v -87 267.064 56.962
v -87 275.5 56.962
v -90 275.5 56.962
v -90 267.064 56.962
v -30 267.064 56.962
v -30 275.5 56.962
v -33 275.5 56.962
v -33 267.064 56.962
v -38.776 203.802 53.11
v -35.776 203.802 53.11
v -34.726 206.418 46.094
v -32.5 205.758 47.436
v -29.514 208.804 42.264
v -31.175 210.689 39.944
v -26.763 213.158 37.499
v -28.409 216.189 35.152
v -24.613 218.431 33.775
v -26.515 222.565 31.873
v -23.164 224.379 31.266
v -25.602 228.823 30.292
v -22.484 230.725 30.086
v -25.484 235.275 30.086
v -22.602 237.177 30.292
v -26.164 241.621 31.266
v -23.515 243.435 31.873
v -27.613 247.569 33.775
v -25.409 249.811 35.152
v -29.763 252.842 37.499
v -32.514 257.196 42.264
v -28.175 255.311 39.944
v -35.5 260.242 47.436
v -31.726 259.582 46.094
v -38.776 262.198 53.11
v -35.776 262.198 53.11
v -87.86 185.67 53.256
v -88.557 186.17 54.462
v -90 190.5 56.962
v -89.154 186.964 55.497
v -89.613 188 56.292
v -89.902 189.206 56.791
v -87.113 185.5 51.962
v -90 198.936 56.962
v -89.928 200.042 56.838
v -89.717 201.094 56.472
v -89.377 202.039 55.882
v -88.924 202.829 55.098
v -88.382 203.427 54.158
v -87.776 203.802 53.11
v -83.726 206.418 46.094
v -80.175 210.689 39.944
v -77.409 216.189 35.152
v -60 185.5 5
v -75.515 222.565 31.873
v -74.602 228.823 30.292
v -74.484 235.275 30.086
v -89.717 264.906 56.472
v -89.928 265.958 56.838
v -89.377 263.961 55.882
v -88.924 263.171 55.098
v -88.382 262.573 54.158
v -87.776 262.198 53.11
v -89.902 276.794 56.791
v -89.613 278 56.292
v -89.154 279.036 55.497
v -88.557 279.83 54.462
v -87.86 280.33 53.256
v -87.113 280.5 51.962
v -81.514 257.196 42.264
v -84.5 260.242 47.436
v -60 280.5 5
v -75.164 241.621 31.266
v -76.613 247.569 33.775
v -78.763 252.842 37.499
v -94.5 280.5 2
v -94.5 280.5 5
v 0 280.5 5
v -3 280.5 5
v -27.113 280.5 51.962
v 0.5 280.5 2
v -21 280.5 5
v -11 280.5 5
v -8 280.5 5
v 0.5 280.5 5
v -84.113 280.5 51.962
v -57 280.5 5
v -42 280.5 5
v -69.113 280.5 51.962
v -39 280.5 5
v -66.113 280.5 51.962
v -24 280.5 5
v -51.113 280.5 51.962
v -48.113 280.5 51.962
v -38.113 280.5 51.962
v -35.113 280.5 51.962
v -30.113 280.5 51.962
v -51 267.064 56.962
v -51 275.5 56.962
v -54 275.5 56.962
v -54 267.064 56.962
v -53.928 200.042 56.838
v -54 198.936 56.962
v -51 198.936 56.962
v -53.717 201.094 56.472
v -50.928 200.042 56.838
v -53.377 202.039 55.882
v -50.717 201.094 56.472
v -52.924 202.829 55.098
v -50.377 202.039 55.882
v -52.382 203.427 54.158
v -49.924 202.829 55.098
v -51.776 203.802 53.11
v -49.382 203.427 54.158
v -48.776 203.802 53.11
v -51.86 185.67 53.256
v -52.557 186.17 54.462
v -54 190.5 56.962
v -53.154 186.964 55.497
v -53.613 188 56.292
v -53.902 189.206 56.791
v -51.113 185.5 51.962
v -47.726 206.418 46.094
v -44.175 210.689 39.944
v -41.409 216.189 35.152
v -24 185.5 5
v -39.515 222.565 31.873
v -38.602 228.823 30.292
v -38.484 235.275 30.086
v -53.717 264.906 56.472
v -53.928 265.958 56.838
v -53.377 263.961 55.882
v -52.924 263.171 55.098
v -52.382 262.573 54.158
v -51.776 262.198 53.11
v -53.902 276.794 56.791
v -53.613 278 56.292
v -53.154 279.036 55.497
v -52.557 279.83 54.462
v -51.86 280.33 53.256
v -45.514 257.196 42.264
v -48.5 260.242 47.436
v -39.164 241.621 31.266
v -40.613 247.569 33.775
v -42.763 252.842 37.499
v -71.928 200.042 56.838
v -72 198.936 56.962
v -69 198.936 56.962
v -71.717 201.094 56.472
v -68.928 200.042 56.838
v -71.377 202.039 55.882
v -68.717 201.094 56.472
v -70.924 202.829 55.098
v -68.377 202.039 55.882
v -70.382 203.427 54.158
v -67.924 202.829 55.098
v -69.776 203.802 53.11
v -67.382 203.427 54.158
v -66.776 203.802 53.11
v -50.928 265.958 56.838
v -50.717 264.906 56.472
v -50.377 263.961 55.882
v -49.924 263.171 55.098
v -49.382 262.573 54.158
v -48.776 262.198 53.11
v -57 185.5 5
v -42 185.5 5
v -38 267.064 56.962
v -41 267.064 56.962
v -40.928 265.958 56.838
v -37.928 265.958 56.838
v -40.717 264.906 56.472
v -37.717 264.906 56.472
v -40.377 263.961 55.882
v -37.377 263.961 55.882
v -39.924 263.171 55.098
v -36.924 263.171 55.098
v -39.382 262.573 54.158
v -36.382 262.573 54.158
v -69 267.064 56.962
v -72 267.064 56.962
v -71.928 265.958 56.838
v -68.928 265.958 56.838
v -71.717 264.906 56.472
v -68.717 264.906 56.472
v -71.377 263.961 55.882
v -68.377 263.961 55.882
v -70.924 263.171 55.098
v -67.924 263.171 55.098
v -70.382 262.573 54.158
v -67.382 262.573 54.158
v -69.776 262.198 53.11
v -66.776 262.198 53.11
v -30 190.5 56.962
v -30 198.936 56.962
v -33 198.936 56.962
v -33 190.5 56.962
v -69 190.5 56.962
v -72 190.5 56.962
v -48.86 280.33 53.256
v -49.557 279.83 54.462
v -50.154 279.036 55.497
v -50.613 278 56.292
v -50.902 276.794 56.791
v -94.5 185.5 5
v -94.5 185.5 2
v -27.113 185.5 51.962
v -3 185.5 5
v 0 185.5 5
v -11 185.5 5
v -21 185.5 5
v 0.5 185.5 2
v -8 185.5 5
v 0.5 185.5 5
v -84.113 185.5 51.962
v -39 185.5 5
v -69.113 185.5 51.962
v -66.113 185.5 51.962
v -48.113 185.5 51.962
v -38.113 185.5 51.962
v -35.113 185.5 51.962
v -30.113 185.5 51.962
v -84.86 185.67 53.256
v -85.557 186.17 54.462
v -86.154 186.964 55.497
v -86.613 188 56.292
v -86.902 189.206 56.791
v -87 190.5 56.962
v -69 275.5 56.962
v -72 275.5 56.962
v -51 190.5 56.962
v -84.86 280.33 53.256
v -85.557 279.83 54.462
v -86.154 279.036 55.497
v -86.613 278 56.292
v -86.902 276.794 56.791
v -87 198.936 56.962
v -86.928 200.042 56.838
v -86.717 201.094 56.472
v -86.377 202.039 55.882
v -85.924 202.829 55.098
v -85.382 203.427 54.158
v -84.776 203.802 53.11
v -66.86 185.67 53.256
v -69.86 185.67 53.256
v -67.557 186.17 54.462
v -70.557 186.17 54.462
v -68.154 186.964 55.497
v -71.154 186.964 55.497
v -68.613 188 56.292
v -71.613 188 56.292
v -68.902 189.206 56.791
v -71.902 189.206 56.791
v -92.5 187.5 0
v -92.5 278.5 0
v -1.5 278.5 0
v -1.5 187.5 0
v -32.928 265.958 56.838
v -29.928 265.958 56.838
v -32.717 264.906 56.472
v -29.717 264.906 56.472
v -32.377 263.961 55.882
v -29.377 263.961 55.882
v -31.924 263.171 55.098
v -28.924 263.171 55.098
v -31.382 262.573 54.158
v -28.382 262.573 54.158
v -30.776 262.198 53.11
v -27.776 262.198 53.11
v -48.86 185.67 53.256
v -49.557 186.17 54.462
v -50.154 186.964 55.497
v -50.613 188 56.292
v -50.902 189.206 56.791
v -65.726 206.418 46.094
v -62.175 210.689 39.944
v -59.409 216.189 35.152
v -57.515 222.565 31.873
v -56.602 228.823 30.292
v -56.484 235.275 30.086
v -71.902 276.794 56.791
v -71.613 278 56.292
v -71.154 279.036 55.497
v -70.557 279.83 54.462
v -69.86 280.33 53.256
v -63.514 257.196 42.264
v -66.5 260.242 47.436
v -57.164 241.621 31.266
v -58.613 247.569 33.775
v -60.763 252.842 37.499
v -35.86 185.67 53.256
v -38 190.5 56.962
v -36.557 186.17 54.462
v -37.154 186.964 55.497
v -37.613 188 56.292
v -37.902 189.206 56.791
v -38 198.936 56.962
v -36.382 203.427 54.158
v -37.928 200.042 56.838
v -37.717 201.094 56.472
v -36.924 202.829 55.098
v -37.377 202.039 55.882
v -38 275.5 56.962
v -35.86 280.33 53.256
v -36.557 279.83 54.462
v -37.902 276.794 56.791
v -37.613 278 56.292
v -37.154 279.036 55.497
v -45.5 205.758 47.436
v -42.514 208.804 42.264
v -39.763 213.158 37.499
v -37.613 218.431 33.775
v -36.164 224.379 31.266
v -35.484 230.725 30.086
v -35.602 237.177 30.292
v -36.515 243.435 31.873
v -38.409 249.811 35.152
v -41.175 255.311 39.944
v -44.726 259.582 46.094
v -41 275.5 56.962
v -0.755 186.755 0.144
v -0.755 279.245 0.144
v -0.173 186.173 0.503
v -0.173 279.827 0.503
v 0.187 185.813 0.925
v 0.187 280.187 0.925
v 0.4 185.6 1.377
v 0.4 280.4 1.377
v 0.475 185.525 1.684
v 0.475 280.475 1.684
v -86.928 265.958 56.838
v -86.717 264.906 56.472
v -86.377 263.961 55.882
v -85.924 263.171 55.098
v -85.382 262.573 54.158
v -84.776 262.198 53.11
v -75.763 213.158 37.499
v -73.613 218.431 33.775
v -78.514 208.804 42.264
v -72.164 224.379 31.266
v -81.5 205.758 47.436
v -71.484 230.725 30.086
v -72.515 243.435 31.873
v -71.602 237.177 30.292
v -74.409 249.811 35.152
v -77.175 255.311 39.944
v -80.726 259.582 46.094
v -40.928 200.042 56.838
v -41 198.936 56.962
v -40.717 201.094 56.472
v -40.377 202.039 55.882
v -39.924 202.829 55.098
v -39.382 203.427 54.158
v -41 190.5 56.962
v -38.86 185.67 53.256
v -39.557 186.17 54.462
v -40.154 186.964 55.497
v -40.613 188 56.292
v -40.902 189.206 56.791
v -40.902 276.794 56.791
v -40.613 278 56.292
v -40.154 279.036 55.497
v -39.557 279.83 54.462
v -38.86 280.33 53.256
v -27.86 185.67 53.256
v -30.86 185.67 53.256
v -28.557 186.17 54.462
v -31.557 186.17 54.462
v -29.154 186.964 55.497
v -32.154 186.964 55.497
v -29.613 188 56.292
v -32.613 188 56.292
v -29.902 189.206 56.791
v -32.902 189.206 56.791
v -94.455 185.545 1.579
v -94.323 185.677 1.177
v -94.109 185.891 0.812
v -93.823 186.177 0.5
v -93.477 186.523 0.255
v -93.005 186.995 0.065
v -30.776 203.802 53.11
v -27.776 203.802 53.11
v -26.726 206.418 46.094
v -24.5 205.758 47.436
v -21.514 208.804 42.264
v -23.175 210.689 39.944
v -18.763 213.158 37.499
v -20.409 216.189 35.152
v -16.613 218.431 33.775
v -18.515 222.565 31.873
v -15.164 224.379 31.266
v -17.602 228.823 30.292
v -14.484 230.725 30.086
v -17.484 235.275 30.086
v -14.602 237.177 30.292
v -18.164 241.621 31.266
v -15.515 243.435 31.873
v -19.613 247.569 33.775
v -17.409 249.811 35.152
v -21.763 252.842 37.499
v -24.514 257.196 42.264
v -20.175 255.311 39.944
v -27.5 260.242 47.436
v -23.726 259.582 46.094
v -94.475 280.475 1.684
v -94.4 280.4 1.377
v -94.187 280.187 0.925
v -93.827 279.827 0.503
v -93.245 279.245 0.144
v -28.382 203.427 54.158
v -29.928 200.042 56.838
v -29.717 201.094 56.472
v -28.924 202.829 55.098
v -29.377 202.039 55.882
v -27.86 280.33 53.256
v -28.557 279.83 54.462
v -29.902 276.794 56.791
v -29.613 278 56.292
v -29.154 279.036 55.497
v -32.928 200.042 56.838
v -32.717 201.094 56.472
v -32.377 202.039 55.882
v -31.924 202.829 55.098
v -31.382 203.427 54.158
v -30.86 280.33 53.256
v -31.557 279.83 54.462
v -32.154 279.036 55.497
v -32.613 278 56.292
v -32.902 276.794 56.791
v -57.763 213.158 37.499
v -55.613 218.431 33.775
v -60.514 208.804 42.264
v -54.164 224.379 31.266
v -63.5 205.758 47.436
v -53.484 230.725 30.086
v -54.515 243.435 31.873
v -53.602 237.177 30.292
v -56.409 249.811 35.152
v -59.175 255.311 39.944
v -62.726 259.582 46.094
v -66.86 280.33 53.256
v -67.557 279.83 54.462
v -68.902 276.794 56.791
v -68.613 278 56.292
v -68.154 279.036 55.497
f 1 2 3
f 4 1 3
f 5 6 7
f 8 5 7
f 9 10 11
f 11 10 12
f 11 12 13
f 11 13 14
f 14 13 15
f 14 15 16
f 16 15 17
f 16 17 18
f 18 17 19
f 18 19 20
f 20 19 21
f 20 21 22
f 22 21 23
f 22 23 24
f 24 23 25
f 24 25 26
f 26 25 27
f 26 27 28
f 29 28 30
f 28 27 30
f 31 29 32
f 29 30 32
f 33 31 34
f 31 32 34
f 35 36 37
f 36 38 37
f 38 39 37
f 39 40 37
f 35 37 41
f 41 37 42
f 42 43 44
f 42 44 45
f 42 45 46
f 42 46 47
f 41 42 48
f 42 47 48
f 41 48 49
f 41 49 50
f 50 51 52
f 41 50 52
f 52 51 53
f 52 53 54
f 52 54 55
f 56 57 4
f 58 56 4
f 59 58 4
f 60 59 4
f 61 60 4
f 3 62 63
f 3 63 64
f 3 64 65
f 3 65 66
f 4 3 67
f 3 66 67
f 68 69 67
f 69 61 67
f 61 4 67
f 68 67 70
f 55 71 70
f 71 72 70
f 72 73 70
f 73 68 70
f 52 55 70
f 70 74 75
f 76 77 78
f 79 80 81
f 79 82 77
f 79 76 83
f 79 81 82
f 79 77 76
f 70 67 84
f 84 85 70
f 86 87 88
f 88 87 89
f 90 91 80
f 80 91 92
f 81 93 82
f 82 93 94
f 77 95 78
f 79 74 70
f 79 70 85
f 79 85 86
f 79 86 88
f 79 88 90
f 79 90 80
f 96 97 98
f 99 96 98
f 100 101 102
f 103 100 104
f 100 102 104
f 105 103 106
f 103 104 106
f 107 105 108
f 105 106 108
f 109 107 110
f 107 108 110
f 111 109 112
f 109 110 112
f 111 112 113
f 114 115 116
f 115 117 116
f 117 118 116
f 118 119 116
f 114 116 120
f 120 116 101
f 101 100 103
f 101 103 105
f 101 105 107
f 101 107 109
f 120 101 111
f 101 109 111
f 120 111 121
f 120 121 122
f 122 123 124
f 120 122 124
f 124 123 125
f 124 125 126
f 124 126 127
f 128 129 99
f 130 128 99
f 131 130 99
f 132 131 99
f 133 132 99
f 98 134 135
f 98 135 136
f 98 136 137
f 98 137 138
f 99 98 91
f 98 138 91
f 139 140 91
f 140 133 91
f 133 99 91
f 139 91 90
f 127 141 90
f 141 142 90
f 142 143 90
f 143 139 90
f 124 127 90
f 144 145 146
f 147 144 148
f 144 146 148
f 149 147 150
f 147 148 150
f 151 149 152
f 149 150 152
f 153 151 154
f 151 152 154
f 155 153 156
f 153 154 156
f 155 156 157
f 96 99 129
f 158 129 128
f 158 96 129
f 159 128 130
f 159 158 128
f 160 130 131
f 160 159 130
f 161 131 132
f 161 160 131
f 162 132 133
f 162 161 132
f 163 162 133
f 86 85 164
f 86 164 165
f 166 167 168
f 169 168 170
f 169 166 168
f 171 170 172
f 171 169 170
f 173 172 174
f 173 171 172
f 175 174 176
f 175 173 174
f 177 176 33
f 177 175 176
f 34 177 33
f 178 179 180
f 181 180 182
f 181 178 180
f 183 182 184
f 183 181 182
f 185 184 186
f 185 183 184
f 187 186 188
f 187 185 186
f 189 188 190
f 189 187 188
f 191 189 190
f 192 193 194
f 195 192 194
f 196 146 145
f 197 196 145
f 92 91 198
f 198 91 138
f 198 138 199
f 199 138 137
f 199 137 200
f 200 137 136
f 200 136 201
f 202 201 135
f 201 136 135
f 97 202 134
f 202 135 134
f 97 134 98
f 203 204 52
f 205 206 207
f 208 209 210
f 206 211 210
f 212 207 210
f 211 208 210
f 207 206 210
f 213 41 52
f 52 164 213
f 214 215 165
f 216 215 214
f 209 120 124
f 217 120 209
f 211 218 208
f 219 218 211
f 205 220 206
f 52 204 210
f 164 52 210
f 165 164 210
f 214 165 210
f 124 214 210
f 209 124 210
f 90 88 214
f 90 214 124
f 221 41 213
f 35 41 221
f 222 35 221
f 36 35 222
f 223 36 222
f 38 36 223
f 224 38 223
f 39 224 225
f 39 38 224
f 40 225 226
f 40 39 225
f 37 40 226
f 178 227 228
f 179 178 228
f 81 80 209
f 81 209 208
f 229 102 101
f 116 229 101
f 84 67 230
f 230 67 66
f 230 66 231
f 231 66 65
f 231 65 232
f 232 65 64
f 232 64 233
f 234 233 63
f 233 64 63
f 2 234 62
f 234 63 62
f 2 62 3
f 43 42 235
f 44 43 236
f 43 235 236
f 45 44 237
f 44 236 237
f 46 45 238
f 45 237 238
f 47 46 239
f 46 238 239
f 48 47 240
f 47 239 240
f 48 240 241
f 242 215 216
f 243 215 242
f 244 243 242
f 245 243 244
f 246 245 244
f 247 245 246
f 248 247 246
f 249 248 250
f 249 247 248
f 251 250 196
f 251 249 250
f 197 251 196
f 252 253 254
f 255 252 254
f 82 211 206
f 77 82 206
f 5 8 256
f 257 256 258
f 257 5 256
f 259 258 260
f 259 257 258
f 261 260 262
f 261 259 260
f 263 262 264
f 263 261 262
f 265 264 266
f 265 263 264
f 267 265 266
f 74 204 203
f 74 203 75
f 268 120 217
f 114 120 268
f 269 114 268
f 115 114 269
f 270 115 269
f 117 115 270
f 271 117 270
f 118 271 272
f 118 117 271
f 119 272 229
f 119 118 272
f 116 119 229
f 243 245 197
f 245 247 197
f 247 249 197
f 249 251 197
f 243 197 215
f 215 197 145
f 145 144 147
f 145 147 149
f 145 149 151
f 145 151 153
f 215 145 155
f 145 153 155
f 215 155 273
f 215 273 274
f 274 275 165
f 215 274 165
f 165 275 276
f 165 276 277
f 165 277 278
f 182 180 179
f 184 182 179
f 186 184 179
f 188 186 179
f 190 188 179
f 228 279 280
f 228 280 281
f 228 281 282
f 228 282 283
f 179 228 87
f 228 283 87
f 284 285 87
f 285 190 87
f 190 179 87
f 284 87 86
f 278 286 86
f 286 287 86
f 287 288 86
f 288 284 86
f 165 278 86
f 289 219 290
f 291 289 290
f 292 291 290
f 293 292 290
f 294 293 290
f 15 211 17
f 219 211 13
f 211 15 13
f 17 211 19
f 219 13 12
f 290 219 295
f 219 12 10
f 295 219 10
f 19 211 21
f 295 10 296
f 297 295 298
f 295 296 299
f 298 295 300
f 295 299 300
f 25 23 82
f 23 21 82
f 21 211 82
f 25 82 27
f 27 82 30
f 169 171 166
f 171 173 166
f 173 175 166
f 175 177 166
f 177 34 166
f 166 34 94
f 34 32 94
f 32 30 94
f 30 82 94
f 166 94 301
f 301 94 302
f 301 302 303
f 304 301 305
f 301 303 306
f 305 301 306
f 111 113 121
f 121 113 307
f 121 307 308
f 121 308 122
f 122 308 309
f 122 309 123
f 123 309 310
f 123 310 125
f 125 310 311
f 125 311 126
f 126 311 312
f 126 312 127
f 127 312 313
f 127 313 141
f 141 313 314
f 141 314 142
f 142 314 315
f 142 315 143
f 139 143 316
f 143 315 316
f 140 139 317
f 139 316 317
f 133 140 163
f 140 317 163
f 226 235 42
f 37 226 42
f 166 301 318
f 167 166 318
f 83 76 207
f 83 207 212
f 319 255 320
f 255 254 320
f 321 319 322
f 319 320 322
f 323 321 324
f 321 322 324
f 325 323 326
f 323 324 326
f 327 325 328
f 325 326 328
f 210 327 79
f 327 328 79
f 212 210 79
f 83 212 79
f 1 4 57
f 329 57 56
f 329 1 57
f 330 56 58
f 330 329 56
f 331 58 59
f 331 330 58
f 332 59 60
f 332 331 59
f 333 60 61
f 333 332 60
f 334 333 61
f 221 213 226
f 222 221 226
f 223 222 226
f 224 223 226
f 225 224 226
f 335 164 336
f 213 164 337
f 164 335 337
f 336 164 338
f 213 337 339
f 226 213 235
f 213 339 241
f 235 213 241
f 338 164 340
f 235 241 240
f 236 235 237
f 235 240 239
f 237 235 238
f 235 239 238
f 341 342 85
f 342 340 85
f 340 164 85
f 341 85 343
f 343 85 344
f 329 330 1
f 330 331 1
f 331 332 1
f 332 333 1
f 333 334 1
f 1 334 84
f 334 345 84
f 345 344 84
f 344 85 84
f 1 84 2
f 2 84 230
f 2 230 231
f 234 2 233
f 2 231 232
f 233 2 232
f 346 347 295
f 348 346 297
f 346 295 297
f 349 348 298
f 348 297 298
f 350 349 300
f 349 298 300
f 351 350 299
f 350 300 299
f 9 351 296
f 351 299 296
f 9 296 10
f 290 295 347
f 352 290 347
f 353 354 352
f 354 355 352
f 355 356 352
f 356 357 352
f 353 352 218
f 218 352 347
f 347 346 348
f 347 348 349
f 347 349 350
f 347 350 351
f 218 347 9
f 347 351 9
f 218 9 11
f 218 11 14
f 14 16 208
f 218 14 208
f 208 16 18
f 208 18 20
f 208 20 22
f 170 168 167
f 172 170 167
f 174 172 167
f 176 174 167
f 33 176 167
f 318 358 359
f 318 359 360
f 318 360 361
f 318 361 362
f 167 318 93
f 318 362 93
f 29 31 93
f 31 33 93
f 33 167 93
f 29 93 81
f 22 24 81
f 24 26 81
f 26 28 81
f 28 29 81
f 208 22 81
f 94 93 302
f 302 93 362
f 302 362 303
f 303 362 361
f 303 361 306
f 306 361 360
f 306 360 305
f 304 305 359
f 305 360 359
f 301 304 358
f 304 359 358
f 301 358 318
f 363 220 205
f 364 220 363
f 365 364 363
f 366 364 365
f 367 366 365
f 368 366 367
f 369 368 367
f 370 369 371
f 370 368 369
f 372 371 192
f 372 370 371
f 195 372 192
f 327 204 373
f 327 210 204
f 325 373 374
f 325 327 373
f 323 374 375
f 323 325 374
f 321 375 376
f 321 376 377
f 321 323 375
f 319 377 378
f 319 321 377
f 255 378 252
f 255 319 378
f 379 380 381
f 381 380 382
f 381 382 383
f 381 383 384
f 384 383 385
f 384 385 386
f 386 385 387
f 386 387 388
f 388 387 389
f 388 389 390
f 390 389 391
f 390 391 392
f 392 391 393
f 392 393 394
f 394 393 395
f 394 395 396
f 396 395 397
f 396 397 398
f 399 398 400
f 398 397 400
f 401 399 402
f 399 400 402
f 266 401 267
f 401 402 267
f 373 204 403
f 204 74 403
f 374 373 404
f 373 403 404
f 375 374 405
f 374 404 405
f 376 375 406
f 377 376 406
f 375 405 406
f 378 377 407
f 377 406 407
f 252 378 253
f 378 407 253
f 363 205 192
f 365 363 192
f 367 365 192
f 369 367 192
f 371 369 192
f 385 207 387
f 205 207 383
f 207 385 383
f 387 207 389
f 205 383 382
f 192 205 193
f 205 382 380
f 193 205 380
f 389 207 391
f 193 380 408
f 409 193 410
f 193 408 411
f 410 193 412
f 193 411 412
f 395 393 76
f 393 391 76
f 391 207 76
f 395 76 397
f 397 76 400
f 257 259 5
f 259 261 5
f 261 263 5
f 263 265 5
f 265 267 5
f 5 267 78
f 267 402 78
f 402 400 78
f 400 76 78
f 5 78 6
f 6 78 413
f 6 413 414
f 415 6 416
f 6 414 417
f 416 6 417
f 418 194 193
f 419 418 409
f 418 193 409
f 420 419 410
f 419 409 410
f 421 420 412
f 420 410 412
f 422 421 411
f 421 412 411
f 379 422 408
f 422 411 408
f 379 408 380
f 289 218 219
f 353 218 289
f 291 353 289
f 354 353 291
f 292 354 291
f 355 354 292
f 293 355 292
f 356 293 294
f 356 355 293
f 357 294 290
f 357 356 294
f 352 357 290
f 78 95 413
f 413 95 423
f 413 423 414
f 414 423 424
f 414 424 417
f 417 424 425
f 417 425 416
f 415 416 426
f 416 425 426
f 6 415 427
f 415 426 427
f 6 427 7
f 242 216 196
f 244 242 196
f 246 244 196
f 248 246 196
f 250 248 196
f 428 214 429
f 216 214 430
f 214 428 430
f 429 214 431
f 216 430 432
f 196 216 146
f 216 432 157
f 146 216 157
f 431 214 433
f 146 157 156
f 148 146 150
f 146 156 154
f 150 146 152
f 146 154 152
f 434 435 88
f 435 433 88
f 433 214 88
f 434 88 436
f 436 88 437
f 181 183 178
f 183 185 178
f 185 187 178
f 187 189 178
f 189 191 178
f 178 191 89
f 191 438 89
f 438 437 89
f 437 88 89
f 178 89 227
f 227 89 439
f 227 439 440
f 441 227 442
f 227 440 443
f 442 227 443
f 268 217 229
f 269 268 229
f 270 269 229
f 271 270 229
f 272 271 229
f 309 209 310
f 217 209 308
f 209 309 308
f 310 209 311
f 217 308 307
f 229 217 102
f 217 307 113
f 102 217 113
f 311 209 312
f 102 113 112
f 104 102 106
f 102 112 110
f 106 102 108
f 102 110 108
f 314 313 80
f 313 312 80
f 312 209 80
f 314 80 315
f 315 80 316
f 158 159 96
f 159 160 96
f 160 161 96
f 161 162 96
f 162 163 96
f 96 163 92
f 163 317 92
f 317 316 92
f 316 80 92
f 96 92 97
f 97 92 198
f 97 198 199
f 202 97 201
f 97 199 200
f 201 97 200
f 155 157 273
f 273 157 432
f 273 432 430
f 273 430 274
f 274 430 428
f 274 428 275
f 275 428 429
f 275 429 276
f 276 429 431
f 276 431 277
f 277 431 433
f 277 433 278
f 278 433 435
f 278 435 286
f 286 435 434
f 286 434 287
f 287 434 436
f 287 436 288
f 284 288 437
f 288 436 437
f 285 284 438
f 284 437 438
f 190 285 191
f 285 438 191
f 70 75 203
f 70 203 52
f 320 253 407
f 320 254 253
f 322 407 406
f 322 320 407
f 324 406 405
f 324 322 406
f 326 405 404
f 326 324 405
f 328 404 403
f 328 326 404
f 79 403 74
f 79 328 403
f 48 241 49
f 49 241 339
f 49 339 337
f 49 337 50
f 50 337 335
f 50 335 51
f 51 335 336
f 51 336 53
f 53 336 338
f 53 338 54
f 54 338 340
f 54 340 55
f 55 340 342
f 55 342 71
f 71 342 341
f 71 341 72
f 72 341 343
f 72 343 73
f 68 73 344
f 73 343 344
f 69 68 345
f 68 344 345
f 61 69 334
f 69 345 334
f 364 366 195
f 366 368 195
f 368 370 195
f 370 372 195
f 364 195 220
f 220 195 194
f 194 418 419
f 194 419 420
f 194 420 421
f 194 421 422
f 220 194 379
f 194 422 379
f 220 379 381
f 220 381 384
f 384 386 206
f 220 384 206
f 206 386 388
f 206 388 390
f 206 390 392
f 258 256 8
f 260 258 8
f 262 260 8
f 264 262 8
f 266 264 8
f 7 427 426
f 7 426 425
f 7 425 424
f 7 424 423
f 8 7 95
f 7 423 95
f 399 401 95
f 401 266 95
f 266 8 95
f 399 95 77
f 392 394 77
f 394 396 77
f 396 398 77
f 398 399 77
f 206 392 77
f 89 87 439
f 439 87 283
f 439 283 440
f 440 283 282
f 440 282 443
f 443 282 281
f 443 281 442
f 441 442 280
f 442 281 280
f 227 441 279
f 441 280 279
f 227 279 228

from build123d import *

# Parameters (mm, degrees)
SKETCH026_W     = 95
SKETCH026_H     = 95
PAD018_DEPTH    = 5
PAD019_DEPTH    = 95
SKETCH028_R     = 30
POCKET008_DEPTH = 95.001
FILLET020_R     = 5
FILLET021_R     = 2


with BuildPart() as part:
    # Sketch026 → Pad018 (new body)
    with BuildSketch(Plane.XY):
        Rectangle(SKETCH026_W, SKETCH026_H)
    extrude(amount=PAD018_DEPTH)

    # Sketch027 (on DatumPlane) → Pad019 (join)
    with BuildSketch(Plane(origin=(0, 47.5, 0), x_dir=(-1, 0, 0), z_dir=(0, 1, 0))):
        Polygon((-47, 5), (-17, 56.961524), (-14, 56.961524), (-44, 5), align=None)
        Polygon((-39, 5), (-9, 56.961524), (-6, 56.961524), (-36, 5), align=None)
        Polygon((-26, 5), (4, 56.961524), (7, 56.961524), (-23, 5), align=None)
        Polygon((-8, 5), (22, 56.961524), (25, 56.961524), (-5, 5), align=None)
        Polygon((10, 5), (40, 56.961524), (43, 56.961524), (13, 5), align=None)
    extrude(amount=-PAD019_DEPTH)

    # Sketch028 (on DatumPlane) → Pocket008 (cut, through all)
    with BuildSketch(Plane.YZ.offset(47.5)):
        with Locations((0, 60)):
            Circle(SKETCH028_R)
    extrude(amount=-POCKET008_DEPTH, mode=Mode.SUBTRACT)

    # Fillet020
    fillet020_edges = [part.edges().sort_by_distance(p)[0] for p in [
        (15.5, -47.5, 56.961524),
        (15.5, -29.845731, 56.961524),
        (7.5, -47.5, 56.961524),
        (7.5, -29.845731, 56.961524),
        (-5.5, -47.5, 56.961524),
        (-5.5, -29.845731, 56.961524),
        (-23.5, -47.5, 56.961524),
        (-23.5, -29.845731, 56.961524),
        (-41.5, -47.5, 56.961524),
        (-41.5, -29.845731, 56.961524),
        (15.5, 29.845731, 56.961524),
        (15.5, 47.5, 56.961524),
        (7.5, 29.845731, 56.961524),
        (7.5, 47.5, 56.961524),
        (-5.5, 29.845731, 56.961524),
        (-5.5, 47.5, 56.961524),
        (-23.5, 29.845731, 56.961524),
        (-23.5, 47.5, 56.961524),
        (-41.5, 29.845731, 56.961524),
        (-41.5, 47.5, 56.961524),
    ]]
    fillet(fillet020_edges, radius=FILLET020_R)

    # Fillet021
    fillet021_edges = [part.edges().sort_by_distance(p)[0] for p in [
        (0, 47.5, 0),
        (47.5, 0, 0),
        (0, -47.5, 0),
        (-47.5, 0, 0),
    ]]
    fillet(fillet021_edges, radius=FILLET021_R)


with BuildPart() as part_1:
    # Body012 placement: moved
    add(part.part.moved(Location((-47, 233, 0))))


solid = part_1.part
